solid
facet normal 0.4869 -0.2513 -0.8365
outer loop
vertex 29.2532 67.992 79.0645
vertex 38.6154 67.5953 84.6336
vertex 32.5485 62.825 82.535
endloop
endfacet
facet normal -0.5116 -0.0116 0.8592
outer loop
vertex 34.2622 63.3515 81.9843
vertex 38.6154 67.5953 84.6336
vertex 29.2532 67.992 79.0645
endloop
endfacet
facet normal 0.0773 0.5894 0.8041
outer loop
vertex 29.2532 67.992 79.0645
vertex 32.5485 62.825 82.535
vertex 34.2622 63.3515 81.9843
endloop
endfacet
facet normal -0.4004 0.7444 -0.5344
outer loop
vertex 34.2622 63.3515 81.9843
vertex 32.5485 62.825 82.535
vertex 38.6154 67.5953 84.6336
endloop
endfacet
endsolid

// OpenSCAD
// Auto-generated auxetic polyhedron
points = [
    [32.548540, 62.825005, 82.535002],
    [38.615369, 67.595289, 84.633620],
    [29.253242, 67.991984, 79.064535],
    [34.262197, 63.351503, 81.984275],
];

faces = [
    [0, 1, 2],
    [2, 1, 3],
    [3, 0, 2],
    [1, 0, 3],
];

polyhedron(points = points, faces = faces);
